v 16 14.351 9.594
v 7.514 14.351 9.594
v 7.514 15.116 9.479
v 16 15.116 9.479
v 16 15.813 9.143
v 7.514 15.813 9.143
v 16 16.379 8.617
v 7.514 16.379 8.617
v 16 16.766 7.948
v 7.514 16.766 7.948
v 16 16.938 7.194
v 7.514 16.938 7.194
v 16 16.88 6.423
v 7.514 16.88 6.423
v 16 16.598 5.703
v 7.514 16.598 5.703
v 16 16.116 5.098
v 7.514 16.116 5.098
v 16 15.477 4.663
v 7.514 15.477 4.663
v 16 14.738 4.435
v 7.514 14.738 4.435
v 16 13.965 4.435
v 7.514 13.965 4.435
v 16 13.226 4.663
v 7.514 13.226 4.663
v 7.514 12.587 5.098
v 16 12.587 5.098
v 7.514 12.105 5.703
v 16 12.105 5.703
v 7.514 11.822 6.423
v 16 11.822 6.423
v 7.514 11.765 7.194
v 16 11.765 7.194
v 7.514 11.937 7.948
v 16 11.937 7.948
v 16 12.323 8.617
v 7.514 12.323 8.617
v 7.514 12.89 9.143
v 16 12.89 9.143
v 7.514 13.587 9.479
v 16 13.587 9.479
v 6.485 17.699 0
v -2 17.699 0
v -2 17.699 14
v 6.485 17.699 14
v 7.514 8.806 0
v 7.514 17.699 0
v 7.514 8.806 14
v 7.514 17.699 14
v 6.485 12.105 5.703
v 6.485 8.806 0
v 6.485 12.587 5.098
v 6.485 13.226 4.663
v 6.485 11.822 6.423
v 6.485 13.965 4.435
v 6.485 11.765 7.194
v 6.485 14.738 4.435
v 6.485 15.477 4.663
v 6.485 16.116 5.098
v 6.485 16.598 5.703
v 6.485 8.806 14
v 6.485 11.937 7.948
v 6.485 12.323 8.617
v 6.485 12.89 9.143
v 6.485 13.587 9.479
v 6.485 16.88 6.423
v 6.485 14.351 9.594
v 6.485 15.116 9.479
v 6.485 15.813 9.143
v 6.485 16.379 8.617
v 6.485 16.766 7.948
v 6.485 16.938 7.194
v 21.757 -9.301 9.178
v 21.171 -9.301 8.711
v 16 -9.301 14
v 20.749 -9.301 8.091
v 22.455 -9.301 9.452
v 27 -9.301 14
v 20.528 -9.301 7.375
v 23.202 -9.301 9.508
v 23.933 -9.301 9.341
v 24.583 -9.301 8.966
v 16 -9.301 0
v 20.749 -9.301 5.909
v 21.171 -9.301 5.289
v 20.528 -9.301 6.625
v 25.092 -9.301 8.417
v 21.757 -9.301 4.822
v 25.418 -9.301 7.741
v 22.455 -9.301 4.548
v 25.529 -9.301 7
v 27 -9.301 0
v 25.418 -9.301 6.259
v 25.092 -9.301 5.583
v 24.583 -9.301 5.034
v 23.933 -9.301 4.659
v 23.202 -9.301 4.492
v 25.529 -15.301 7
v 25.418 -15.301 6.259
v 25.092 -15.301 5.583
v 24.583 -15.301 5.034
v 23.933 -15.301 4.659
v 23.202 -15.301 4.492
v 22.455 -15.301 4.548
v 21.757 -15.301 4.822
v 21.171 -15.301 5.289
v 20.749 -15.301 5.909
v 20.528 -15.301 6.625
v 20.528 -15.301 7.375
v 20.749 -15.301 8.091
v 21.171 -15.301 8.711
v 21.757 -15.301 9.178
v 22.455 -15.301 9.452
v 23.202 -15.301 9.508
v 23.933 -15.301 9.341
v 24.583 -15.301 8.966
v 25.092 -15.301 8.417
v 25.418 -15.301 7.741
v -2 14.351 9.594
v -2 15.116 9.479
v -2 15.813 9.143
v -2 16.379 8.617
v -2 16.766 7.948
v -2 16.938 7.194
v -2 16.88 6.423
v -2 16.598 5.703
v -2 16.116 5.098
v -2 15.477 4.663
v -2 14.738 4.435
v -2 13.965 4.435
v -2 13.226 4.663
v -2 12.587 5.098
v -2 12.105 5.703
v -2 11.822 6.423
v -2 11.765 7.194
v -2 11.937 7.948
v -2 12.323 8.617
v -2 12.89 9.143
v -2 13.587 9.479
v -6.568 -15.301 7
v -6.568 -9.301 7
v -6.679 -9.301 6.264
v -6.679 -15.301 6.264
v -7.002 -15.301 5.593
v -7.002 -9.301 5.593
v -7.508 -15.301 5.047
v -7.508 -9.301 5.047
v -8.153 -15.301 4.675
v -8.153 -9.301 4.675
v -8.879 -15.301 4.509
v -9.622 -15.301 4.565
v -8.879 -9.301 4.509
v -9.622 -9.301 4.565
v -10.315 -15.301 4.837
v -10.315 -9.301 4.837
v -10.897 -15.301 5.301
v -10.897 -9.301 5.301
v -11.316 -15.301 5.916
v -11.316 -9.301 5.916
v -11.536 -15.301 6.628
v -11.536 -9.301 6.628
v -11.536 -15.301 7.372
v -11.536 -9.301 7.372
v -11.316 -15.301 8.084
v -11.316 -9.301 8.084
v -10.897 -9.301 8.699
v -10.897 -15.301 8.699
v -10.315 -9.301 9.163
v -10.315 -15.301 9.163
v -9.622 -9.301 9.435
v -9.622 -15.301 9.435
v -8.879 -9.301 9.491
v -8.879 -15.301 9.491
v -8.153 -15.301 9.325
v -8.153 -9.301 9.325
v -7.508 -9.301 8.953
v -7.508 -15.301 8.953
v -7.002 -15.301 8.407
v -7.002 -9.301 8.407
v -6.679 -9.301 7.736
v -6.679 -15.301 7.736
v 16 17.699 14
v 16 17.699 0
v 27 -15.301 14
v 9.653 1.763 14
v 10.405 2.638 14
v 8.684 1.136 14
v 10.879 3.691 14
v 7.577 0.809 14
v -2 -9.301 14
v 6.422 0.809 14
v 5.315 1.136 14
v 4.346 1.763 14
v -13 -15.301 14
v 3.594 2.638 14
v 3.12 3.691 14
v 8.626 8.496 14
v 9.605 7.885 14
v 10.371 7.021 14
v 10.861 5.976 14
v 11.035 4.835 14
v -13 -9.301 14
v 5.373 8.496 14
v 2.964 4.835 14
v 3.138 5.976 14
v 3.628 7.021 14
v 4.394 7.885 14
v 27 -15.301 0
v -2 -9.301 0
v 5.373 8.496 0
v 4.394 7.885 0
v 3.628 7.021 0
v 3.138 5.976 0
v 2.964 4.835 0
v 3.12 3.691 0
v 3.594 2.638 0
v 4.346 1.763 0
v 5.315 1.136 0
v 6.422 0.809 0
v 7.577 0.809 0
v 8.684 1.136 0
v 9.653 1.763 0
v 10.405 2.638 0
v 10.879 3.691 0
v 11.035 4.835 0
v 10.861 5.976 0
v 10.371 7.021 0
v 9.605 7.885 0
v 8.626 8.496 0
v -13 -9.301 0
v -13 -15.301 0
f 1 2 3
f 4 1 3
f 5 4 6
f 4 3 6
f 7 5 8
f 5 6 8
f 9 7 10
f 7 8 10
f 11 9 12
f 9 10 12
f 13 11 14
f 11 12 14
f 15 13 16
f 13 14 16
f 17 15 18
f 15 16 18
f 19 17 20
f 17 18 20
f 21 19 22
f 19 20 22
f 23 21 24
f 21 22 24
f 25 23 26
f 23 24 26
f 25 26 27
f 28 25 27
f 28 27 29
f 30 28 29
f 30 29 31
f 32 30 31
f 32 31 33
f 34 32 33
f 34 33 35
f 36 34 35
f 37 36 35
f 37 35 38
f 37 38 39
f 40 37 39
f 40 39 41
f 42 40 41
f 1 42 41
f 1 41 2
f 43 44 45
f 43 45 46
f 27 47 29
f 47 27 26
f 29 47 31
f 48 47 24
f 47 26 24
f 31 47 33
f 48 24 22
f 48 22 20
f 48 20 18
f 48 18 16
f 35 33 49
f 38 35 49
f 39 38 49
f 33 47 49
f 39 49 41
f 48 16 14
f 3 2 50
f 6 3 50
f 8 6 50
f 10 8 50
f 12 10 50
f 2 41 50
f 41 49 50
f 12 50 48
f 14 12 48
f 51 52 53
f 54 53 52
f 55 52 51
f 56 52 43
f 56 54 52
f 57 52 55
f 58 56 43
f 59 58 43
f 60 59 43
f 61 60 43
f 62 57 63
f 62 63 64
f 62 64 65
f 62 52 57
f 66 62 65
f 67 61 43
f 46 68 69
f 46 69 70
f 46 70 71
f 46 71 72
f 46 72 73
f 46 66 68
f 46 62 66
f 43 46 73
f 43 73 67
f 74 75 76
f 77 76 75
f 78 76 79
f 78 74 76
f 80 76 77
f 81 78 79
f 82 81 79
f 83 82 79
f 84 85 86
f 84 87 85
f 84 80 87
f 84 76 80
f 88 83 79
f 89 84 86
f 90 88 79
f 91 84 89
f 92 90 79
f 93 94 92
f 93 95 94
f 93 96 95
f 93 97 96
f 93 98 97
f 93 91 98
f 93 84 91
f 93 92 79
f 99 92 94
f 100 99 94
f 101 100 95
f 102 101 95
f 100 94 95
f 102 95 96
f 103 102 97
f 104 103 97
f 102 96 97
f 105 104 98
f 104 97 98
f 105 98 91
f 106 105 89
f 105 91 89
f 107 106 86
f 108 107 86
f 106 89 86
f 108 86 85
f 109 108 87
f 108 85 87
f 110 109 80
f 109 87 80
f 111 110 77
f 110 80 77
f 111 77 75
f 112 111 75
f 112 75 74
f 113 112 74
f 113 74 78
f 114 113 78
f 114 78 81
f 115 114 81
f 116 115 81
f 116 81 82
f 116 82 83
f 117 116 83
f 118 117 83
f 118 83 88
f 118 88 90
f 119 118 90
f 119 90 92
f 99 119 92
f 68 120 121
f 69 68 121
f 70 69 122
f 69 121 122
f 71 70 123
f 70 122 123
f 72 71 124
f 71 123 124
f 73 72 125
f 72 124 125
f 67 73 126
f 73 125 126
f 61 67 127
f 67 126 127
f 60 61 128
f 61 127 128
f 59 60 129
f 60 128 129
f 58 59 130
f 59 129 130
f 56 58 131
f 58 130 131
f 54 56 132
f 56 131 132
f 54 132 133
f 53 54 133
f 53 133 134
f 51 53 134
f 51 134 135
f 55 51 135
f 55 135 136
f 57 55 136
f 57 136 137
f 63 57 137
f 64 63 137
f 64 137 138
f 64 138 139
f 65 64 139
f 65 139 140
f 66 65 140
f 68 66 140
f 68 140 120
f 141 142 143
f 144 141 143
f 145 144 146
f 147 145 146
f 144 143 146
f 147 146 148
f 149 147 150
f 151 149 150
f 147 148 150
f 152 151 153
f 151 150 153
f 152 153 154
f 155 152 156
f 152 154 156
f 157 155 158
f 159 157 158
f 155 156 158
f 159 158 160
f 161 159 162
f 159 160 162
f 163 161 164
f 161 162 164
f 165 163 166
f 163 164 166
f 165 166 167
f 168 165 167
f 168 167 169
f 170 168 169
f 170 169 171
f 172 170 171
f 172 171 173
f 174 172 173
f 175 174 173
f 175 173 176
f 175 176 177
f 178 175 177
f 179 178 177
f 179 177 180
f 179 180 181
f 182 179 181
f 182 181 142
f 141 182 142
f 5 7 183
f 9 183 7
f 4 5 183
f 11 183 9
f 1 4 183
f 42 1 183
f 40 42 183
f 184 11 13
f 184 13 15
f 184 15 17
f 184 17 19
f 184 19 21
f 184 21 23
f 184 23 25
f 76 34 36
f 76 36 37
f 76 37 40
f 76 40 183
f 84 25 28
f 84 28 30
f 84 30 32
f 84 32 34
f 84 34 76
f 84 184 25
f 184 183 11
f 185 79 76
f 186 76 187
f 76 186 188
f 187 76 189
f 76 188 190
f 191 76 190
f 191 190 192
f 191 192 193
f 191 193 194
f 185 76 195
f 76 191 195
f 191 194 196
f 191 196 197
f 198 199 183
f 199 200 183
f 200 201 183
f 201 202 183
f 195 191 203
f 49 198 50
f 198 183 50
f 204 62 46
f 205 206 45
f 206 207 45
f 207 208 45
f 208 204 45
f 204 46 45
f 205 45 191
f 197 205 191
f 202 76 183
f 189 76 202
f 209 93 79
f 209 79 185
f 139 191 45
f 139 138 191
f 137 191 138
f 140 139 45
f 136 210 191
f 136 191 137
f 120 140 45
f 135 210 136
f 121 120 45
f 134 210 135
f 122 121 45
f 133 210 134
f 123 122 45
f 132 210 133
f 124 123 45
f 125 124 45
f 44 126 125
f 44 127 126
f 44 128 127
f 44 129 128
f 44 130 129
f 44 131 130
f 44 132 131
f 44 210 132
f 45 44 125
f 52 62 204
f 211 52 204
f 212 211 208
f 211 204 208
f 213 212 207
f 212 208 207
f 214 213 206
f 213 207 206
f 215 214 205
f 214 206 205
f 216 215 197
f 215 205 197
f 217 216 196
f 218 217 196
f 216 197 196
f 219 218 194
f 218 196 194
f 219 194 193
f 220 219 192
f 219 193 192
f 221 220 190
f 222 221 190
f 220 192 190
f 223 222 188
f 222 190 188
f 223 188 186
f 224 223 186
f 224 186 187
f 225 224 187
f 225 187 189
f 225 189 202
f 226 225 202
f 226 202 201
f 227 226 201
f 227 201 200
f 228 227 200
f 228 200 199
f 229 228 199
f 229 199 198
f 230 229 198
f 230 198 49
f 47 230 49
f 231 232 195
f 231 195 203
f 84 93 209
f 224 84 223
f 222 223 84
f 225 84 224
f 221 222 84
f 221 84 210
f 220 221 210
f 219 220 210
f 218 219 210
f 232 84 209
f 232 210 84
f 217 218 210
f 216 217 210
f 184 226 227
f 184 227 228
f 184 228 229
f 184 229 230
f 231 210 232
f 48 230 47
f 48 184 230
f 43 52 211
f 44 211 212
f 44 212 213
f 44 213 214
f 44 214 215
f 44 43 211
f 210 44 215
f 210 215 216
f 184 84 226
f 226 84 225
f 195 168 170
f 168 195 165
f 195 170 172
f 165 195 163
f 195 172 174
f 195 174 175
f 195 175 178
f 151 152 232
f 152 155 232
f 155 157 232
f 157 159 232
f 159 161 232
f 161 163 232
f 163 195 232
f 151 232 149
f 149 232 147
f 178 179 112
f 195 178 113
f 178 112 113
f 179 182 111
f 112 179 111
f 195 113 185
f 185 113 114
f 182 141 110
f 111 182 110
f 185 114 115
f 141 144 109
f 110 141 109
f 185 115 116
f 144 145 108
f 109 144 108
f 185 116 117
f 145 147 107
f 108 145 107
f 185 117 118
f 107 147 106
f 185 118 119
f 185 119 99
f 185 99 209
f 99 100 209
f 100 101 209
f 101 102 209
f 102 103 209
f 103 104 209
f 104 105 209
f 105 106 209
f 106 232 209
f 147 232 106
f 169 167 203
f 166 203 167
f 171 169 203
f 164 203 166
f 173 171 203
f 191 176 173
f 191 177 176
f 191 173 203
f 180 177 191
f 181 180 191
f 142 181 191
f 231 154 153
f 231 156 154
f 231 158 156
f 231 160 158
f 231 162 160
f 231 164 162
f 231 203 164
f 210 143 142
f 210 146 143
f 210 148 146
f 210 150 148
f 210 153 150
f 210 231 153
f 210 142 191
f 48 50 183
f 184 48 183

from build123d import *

# Parameters (mm, degrees)
SALIENTE_EXTRUIR1_DEPTH = 14
CROQUIS2_R              = 4.035649311
CORTAR_EXTRUIR1_DEPTH   = 14
CROQUIS5_R              = 2.497749653
CORTAR_EXTRUIR2_DEPTH   = 14
CROQUIS7_R              = 2.514867633
CORTAR_EXTRUIR3_DEPTH   = 14
CROQUIS8_W              = 1.02892534
CROQUIS8_H              = 10.439450899
CORTAR_EXTRUIR4_DEPTH   = 14
CROQUIS9_R              = 2.593975345
CORTAR_EXTRUIR5_DEPTH   = 30


with BuildPart() as part:
    # Croquis1 → Saliente-Extruir1 (new body)
    with BuildSketch(Plane.XY):
        Polygon((-2.000386176, 17.69916911), (15.999613824, 17.69916911), (15.999613824, -9.30083089), (26.999613824, -9.30083089), (26.999613824, -15.30083089), (15.999613824, -15.30083089), (-2.000386176, -15.30083089), (-13.000386176, -15.30083089), (-13.000386176, -9.30083089), (-2.000386176, -9.30083089), align=None)
    extrude(amount=SALIENTE_EXTRUIR1_DEPTH)

    # Croquis2 → Cortar-Extruir1 (cut)
    with BuildSketch(Plane.XY.offset(14)):
        with Locations((6.999613824, 4.803097651)):
            Circle(CROQUIS2_R)
    extrude(amount=-CORTAR_EXTRUIR1_DEPTH, mode=Mode.SUBTRACT)

    # Croquis5 → Cortar-Extruir2 (cut)
    with BuildSketch(Plane(origin=(0, -9.30083089, 0), x_dir=(1, 0, 0), z_dir=(0, 1, 0))):
        with Locations((-9.06576441, -7)):
            Circle(CROQUIS5_R)
    extrude(amount=-CORTAR_EXTRUIR2_DEPTH, mode=Mode.SUBTRACT)

    # Croquis7 → Cortar-Extruir3 (cut)
    with BuildSketch(Plane(origin=(0, -9.30083089, 0), x_dir=(1, 0, 0), z_dir=(0, 1, 0))):
        with Locations((23.014515722, -7)):
            Circle(CROQUIS7_R)
    extrude(amount=-CORTAR_EXTRUIR3_DEPTH, mode=Mode.SUBTRACT)

    # Croquis8 → Cortar-Extruir4 (cut)
    with BuildSketch(Plane.XY.offset(14)):
        with Locations((6.999613824, 13.435682)):
            Rectangle(CROQUIS8_W, CROQUIS8_H)
    extrude(amount=-CORTAR_EXTRUIR4_DEPTH, mode=Mode.SUBTRACT)

    # Croquis9 → Cortar-Extruir5 (cut, through all)
    with BuildSketch(Plane.ZY.offset(2.000386176)):
        with Locations((7, 14.351263228)):
            Circle(CROQUIS9_R)
    extrude(amount=-CORTAR_EXTRUIR5_DEPTH, mode=Mode.SUBTRACT)


solid = part.part
